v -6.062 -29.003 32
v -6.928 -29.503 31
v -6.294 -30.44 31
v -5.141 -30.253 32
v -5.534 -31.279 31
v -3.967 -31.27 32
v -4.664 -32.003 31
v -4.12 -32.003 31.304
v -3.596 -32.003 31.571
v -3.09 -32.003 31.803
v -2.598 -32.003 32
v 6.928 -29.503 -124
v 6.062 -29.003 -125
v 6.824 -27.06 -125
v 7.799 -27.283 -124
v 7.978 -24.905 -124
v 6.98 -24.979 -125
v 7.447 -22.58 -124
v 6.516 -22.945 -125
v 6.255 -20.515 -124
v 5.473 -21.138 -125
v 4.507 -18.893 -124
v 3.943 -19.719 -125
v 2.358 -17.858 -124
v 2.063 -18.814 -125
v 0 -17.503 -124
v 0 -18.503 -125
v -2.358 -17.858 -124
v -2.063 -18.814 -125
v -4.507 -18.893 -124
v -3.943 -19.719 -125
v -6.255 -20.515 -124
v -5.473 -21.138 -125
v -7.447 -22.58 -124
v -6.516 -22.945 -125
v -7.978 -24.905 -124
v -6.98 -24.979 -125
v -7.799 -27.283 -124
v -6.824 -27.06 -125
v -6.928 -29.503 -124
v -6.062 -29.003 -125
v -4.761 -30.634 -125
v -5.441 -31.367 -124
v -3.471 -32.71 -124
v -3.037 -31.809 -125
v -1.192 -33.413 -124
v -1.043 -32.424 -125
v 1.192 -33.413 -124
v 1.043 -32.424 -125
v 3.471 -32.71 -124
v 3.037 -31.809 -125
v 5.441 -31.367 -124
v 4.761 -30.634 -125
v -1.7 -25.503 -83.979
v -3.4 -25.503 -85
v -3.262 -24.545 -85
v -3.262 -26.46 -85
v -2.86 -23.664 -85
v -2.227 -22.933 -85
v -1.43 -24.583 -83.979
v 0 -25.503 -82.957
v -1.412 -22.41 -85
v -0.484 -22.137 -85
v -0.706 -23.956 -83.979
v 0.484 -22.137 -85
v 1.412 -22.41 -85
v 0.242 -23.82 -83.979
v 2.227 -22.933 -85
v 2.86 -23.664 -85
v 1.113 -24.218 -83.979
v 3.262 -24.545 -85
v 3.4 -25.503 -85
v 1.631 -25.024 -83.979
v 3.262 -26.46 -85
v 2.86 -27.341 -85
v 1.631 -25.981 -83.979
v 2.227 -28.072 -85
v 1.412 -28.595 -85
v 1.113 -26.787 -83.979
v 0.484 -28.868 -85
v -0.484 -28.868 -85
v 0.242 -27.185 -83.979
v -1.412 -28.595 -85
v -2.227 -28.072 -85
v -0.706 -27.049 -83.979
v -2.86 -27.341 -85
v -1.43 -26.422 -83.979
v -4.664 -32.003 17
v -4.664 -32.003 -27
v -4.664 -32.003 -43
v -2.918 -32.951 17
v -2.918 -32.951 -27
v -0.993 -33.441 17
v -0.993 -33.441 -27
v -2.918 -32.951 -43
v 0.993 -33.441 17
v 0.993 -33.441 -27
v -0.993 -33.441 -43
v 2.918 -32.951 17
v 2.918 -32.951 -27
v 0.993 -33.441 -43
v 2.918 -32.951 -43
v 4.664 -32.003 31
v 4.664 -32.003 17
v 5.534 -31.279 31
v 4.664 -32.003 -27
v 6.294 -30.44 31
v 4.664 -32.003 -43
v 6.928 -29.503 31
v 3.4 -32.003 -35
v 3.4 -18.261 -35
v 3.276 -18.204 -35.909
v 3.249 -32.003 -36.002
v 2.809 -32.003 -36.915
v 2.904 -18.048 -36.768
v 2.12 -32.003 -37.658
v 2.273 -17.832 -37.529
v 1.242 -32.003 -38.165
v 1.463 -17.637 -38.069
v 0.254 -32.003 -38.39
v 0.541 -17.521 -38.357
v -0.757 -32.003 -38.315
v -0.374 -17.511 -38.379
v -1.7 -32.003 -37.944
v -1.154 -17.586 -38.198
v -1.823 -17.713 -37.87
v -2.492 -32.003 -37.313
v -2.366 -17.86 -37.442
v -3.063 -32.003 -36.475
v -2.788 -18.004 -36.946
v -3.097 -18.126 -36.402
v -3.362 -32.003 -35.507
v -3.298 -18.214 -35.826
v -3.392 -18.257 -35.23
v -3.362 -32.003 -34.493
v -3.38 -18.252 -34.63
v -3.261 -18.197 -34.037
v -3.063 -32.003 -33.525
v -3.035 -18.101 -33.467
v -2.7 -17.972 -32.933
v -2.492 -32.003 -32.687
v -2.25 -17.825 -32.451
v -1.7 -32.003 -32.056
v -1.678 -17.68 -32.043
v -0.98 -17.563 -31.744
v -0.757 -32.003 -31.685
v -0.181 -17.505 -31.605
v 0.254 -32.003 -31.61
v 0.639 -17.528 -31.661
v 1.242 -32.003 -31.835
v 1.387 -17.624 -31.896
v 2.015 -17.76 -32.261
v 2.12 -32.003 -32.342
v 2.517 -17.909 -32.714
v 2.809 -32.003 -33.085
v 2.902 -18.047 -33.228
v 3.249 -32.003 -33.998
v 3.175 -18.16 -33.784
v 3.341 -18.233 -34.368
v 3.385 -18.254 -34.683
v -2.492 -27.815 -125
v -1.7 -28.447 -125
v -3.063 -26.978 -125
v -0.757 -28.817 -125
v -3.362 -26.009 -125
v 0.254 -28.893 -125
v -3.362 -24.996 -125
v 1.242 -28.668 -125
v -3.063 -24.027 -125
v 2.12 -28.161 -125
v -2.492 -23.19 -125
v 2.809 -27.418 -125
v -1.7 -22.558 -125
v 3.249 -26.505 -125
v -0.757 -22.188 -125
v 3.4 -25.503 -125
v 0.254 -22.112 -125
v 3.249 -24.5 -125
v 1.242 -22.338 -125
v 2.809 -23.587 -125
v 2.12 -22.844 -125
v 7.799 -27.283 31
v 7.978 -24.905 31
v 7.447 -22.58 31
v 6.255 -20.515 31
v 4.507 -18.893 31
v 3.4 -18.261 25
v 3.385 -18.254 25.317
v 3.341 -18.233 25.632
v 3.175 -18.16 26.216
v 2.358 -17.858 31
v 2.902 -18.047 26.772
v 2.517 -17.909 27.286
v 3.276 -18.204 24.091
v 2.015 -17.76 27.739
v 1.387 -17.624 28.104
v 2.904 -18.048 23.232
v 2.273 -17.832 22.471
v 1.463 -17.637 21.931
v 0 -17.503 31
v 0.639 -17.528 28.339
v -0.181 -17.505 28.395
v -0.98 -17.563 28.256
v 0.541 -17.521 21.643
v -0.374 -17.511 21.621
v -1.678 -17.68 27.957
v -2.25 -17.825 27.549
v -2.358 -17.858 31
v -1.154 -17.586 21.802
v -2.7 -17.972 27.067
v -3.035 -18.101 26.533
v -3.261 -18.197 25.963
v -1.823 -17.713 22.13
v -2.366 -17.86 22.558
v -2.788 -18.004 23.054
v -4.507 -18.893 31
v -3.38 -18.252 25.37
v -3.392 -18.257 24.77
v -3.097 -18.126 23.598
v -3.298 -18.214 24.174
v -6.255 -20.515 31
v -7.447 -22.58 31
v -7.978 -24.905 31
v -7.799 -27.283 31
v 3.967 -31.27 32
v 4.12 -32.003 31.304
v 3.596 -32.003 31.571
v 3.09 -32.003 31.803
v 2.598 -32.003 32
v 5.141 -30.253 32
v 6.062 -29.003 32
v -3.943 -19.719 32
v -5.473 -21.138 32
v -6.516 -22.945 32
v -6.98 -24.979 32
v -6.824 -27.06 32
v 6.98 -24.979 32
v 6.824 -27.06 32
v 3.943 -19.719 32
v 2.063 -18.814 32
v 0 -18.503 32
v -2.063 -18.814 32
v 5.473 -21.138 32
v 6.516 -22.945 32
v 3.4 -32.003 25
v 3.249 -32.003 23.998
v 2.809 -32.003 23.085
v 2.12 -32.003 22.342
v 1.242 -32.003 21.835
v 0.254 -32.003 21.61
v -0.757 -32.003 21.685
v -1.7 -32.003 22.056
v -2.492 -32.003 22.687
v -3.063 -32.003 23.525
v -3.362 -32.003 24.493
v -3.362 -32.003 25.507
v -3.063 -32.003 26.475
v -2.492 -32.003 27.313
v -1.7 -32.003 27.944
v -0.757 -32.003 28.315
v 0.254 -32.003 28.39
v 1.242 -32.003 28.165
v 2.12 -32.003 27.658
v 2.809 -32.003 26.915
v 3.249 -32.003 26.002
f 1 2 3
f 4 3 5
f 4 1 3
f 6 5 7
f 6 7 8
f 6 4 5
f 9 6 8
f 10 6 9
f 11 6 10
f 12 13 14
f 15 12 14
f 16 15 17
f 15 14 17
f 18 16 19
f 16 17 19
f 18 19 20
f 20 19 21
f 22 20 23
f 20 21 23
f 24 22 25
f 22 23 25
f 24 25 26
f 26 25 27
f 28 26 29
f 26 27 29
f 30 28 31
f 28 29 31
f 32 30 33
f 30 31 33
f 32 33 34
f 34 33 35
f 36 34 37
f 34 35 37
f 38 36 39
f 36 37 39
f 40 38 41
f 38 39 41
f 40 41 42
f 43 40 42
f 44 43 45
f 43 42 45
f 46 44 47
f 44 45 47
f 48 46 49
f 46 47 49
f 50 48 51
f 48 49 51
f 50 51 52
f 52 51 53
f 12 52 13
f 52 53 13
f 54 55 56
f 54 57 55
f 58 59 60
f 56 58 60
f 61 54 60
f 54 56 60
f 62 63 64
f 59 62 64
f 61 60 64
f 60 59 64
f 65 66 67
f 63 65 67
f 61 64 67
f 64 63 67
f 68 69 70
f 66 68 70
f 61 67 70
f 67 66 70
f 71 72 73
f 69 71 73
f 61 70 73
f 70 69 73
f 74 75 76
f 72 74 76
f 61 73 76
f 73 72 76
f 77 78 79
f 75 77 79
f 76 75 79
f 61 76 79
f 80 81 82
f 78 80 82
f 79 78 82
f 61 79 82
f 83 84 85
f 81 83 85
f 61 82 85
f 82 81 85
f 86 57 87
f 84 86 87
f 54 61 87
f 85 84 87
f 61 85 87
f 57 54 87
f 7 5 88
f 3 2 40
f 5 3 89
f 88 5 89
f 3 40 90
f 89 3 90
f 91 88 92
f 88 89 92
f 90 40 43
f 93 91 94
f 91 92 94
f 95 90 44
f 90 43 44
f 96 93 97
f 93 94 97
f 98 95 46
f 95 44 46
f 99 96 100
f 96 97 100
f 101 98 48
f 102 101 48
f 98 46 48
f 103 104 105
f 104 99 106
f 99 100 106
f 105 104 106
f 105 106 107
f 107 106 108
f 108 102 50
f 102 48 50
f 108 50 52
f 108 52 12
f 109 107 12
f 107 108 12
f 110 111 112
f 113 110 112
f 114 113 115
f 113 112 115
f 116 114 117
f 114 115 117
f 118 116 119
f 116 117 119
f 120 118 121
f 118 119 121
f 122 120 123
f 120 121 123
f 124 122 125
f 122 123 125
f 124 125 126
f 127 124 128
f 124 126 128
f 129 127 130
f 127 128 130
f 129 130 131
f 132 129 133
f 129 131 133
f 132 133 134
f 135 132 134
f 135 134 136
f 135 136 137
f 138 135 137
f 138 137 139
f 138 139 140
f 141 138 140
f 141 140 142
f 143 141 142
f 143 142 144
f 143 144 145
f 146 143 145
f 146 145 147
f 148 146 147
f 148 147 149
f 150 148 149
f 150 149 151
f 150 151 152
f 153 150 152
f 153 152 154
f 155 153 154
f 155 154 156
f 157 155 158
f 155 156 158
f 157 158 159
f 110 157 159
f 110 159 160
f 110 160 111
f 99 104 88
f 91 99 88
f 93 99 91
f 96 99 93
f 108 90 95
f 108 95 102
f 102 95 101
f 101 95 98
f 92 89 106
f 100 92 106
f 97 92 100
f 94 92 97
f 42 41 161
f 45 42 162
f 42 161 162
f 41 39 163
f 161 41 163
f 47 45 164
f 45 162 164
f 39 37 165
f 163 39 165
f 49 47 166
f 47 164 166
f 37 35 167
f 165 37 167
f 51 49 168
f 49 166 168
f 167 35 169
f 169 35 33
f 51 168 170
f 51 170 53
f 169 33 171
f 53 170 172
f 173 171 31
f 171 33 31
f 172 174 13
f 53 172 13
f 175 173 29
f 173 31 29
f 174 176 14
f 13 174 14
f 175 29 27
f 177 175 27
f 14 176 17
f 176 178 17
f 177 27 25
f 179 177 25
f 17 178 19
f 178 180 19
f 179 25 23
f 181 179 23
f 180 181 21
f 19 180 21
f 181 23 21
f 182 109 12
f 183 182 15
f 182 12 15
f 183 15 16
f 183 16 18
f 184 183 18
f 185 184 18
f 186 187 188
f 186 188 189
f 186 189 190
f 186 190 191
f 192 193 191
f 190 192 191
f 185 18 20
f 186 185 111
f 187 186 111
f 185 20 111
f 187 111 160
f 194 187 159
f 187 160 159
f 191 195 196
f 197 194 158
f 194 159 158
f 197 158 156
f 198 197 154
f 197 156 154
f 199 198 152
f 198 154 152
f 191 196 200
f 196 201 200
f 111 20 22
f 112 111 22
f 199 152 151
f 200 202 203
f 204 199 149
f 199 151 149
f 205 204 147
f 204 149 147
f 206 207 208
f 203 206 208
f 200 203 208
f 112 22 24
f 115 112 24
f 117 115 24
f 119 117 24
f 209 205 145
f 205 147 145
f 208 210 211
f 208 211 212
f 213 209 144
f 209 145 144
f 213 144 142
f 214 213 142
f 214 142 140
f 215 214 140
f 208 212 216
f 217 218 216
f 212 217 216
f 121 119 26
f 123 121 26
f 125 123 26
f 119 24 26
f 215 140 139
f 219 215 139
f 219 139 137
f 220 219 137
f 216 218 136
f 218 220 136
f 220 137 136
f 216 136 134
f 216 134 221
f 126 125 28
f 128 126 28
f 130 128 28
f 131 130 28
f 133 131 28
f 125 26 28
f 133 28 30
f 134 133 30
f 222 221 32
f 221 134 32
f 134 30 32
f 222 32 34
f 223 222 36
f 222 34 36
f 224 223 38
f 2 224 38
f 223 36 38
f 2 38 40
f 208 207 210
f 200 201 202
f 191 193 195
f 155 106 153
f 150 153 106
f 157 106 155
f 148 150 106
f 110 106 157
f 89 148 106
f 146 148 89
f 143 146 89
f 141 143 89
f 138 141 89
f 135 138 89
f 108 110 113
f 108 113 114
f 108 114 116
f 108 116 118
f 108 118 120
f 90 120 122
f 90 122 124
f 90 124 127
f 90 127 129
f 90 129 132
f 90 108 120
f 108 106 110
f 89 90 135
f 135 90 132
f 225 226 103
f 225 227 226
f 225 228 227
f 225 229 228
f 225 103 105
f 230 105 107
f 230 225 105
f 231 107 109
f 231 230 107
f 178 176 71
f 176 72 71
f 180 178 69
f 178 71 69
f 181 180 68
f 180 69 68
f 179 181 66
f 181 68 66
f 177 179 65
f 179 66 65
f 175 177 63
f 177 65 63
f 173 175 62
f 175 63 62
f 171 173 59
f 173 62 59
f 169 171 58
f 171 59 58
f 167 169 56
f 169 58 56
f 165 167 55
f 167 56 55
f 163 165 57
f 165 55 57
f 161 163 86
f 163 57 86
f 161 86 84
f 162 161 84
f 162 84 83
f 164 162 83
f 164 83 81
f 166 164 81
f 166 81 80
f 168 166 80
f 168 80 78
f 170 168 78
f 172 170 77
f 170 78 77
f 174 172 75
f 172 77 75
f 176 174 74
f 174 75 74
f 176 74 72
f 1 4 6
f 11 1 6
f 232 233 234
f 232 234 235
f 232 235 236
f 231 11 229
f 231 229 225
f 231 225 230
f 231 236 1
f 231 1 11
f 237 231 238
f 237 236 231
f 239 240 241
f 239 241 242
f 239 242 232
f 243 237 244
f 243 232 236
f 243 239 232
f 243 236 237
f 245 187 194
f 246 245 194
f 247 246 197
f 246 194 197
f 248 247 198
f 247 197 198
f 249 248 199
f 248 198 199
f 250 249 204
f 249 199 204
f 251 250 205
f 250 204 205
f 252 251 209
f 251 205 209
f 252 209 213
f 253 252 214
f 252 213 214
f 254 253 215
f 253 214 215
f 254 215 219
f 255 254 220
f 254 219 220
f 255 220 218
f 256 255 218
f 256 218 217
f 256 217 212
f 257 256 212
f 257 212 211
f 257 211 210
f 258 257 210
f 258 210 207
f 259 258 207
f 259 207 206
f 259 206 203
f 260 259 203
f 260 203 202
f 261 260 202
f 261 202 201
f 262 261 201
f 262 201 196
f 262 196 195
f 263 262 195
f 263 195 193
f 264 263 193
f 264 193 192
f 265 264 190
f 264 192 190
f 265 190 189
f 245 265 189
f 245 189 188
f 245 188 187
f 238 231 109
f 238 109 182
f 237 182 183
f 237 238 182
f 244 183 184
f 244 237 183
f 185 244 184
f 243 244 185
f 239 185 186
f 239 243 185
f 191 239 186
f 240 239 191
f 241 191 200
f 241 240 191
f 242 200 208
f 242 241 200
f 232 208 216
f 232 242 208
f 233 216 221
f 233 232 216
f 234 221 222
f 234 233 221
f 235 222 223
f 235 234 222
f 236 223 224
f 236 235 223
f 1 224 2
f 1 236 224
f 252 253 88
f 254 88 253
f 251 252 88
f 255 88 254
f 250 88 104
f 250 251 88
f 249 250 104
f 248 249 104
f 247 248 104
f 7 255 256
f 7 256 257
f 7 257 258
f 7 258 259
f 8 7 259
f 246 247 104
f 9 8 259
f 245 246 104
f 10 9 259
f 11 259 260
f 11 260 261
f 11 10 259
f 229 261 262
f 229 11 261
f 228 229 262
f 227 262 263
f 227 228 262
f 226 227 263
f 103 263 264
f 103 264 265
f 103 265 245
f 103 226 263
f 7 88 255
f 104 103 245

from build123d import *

# Parameters (mm, degrees)
BOSS_EXTRUDE1_DEPTH      = 32
BOSS_EXTRUDE1_DEPTH_BACK = 125
CUT_EXTRUDE1_DEPTH       = 15
CUT_EXTRUDE2_DEPTH       = 16
M8_TAPPED_HOLE1_D        = 6.8
M8_TAPPED_HOLE1_DEPTH    = 40
M8_TAPPED_HOLE1_TIP      = 2.042926105
CHAMFER1_SIZE            = 1
CHAMFER2_SIZE            = 1
M8_TAPPED_HOLE2_D        = 6.8


with BuildPart() as part:
    # Sketch1 → Boss-Extrude1 (new, two sides: drawn at the far end of the back side and taken through both)
    with BuildSketch(Plane.XY.offset(-BOSS_EXTRUDE1_DEPTH_BACK)):
        with BuildLine():
            ThreePointArc((6.92820323, -29.502537206), (0, -17.502537206), (-6.92820323, -29.502537206))
            ThreePointArc((-6.92820323, -29.502537206), (0, -33.502537206), (6.92820323, -29.502537206))
        make_face()
    extrude(amount=BOSS_EXTRUDE1_DEPTH + BOSS_EXTRUDE1_DEPTH_BACK)

    # Sketch2 → Cut-Extrude1 (cut)
    with BuildSketch(Plane.XY.offset(32)):
        with BuildLine():
            Line((-4.663689527, -32.002537206), (4.663689527, -32.002537206))
            ThreePointArc((4.663689527, -32.002537206), (0, -33.502537206), (-4.663689527, -32.002537206))
        make_face()
    extrude(amount=-CUT_EXTRUDE1_DEPTH, mode=Mode.SUBTRACT)

    # Sketch3 → Cut-Extrude2 (cut)
    with BuildSketch(Plane.XY.offset(-43)):
        with BuildLine():
            Line((4.663689527, -32.002537206), (-4.663689527, -32.002537206))
            ThreePointArc((-4.663689527, -32.002537206), (0, -33.502537206), (4.663689527, -32.002537206))
        make_face()
    extrude(amount=CUT_EXTRUDE2_DEPTH, mode=Mode.SUBTRACT)

    # M8 Tapped Hole1
    with Locations(Plane(origin=(0, 0, -125), x_dir=(-1, 0, 0), z_dir=(0, 0, -1))):
        with Locations((0, -25.502537206)):
            Hole(M8_TAPPED_HOLE1_D / 2, depth=M8_TAPPED_HOLE1_DEPTH)
            with Locations((0, 0, -(M8_TAPPED_HOLE1_DEPTH + M8_TAPPED_HOLE1_TIP / 2))):  # 118° drill point
                Cone(0, M8_TAPPED_HOLE1_D / 2, M8_TAPPED_HOLE1_TIP, mode=Mode.SUBTRACT)

    # Chamfer1
    chamfer1_edges = [part.edges().sort_by_distance(p)[0] for p in [
        (6.92820323, -21.502537206, -125),
    ]]
    chamfer(chamfer1_edges, length=CHAMFER1_SIZE)

    # Chamfer2
    chamfer2_edges = [part.edges().sort_by_distance(p)[0] for p in [
        (1.686566209, -17.682339356, 32),
    ]]
    chamfer(chamfer2_edges, length=CHAMFER2_SIZE)

    # M8 Tapped Hole2 (through all)
    with Locations(Plane(origin=(0, -32.002537206, 0), x_dir=(-1, 0, 0), z_dir=(0, -1, 0))):
        with Locations((0, -25), (0, 35)):
            Hole(M8_TAPPED_HOLE2_D / 2)


solid = part.part
